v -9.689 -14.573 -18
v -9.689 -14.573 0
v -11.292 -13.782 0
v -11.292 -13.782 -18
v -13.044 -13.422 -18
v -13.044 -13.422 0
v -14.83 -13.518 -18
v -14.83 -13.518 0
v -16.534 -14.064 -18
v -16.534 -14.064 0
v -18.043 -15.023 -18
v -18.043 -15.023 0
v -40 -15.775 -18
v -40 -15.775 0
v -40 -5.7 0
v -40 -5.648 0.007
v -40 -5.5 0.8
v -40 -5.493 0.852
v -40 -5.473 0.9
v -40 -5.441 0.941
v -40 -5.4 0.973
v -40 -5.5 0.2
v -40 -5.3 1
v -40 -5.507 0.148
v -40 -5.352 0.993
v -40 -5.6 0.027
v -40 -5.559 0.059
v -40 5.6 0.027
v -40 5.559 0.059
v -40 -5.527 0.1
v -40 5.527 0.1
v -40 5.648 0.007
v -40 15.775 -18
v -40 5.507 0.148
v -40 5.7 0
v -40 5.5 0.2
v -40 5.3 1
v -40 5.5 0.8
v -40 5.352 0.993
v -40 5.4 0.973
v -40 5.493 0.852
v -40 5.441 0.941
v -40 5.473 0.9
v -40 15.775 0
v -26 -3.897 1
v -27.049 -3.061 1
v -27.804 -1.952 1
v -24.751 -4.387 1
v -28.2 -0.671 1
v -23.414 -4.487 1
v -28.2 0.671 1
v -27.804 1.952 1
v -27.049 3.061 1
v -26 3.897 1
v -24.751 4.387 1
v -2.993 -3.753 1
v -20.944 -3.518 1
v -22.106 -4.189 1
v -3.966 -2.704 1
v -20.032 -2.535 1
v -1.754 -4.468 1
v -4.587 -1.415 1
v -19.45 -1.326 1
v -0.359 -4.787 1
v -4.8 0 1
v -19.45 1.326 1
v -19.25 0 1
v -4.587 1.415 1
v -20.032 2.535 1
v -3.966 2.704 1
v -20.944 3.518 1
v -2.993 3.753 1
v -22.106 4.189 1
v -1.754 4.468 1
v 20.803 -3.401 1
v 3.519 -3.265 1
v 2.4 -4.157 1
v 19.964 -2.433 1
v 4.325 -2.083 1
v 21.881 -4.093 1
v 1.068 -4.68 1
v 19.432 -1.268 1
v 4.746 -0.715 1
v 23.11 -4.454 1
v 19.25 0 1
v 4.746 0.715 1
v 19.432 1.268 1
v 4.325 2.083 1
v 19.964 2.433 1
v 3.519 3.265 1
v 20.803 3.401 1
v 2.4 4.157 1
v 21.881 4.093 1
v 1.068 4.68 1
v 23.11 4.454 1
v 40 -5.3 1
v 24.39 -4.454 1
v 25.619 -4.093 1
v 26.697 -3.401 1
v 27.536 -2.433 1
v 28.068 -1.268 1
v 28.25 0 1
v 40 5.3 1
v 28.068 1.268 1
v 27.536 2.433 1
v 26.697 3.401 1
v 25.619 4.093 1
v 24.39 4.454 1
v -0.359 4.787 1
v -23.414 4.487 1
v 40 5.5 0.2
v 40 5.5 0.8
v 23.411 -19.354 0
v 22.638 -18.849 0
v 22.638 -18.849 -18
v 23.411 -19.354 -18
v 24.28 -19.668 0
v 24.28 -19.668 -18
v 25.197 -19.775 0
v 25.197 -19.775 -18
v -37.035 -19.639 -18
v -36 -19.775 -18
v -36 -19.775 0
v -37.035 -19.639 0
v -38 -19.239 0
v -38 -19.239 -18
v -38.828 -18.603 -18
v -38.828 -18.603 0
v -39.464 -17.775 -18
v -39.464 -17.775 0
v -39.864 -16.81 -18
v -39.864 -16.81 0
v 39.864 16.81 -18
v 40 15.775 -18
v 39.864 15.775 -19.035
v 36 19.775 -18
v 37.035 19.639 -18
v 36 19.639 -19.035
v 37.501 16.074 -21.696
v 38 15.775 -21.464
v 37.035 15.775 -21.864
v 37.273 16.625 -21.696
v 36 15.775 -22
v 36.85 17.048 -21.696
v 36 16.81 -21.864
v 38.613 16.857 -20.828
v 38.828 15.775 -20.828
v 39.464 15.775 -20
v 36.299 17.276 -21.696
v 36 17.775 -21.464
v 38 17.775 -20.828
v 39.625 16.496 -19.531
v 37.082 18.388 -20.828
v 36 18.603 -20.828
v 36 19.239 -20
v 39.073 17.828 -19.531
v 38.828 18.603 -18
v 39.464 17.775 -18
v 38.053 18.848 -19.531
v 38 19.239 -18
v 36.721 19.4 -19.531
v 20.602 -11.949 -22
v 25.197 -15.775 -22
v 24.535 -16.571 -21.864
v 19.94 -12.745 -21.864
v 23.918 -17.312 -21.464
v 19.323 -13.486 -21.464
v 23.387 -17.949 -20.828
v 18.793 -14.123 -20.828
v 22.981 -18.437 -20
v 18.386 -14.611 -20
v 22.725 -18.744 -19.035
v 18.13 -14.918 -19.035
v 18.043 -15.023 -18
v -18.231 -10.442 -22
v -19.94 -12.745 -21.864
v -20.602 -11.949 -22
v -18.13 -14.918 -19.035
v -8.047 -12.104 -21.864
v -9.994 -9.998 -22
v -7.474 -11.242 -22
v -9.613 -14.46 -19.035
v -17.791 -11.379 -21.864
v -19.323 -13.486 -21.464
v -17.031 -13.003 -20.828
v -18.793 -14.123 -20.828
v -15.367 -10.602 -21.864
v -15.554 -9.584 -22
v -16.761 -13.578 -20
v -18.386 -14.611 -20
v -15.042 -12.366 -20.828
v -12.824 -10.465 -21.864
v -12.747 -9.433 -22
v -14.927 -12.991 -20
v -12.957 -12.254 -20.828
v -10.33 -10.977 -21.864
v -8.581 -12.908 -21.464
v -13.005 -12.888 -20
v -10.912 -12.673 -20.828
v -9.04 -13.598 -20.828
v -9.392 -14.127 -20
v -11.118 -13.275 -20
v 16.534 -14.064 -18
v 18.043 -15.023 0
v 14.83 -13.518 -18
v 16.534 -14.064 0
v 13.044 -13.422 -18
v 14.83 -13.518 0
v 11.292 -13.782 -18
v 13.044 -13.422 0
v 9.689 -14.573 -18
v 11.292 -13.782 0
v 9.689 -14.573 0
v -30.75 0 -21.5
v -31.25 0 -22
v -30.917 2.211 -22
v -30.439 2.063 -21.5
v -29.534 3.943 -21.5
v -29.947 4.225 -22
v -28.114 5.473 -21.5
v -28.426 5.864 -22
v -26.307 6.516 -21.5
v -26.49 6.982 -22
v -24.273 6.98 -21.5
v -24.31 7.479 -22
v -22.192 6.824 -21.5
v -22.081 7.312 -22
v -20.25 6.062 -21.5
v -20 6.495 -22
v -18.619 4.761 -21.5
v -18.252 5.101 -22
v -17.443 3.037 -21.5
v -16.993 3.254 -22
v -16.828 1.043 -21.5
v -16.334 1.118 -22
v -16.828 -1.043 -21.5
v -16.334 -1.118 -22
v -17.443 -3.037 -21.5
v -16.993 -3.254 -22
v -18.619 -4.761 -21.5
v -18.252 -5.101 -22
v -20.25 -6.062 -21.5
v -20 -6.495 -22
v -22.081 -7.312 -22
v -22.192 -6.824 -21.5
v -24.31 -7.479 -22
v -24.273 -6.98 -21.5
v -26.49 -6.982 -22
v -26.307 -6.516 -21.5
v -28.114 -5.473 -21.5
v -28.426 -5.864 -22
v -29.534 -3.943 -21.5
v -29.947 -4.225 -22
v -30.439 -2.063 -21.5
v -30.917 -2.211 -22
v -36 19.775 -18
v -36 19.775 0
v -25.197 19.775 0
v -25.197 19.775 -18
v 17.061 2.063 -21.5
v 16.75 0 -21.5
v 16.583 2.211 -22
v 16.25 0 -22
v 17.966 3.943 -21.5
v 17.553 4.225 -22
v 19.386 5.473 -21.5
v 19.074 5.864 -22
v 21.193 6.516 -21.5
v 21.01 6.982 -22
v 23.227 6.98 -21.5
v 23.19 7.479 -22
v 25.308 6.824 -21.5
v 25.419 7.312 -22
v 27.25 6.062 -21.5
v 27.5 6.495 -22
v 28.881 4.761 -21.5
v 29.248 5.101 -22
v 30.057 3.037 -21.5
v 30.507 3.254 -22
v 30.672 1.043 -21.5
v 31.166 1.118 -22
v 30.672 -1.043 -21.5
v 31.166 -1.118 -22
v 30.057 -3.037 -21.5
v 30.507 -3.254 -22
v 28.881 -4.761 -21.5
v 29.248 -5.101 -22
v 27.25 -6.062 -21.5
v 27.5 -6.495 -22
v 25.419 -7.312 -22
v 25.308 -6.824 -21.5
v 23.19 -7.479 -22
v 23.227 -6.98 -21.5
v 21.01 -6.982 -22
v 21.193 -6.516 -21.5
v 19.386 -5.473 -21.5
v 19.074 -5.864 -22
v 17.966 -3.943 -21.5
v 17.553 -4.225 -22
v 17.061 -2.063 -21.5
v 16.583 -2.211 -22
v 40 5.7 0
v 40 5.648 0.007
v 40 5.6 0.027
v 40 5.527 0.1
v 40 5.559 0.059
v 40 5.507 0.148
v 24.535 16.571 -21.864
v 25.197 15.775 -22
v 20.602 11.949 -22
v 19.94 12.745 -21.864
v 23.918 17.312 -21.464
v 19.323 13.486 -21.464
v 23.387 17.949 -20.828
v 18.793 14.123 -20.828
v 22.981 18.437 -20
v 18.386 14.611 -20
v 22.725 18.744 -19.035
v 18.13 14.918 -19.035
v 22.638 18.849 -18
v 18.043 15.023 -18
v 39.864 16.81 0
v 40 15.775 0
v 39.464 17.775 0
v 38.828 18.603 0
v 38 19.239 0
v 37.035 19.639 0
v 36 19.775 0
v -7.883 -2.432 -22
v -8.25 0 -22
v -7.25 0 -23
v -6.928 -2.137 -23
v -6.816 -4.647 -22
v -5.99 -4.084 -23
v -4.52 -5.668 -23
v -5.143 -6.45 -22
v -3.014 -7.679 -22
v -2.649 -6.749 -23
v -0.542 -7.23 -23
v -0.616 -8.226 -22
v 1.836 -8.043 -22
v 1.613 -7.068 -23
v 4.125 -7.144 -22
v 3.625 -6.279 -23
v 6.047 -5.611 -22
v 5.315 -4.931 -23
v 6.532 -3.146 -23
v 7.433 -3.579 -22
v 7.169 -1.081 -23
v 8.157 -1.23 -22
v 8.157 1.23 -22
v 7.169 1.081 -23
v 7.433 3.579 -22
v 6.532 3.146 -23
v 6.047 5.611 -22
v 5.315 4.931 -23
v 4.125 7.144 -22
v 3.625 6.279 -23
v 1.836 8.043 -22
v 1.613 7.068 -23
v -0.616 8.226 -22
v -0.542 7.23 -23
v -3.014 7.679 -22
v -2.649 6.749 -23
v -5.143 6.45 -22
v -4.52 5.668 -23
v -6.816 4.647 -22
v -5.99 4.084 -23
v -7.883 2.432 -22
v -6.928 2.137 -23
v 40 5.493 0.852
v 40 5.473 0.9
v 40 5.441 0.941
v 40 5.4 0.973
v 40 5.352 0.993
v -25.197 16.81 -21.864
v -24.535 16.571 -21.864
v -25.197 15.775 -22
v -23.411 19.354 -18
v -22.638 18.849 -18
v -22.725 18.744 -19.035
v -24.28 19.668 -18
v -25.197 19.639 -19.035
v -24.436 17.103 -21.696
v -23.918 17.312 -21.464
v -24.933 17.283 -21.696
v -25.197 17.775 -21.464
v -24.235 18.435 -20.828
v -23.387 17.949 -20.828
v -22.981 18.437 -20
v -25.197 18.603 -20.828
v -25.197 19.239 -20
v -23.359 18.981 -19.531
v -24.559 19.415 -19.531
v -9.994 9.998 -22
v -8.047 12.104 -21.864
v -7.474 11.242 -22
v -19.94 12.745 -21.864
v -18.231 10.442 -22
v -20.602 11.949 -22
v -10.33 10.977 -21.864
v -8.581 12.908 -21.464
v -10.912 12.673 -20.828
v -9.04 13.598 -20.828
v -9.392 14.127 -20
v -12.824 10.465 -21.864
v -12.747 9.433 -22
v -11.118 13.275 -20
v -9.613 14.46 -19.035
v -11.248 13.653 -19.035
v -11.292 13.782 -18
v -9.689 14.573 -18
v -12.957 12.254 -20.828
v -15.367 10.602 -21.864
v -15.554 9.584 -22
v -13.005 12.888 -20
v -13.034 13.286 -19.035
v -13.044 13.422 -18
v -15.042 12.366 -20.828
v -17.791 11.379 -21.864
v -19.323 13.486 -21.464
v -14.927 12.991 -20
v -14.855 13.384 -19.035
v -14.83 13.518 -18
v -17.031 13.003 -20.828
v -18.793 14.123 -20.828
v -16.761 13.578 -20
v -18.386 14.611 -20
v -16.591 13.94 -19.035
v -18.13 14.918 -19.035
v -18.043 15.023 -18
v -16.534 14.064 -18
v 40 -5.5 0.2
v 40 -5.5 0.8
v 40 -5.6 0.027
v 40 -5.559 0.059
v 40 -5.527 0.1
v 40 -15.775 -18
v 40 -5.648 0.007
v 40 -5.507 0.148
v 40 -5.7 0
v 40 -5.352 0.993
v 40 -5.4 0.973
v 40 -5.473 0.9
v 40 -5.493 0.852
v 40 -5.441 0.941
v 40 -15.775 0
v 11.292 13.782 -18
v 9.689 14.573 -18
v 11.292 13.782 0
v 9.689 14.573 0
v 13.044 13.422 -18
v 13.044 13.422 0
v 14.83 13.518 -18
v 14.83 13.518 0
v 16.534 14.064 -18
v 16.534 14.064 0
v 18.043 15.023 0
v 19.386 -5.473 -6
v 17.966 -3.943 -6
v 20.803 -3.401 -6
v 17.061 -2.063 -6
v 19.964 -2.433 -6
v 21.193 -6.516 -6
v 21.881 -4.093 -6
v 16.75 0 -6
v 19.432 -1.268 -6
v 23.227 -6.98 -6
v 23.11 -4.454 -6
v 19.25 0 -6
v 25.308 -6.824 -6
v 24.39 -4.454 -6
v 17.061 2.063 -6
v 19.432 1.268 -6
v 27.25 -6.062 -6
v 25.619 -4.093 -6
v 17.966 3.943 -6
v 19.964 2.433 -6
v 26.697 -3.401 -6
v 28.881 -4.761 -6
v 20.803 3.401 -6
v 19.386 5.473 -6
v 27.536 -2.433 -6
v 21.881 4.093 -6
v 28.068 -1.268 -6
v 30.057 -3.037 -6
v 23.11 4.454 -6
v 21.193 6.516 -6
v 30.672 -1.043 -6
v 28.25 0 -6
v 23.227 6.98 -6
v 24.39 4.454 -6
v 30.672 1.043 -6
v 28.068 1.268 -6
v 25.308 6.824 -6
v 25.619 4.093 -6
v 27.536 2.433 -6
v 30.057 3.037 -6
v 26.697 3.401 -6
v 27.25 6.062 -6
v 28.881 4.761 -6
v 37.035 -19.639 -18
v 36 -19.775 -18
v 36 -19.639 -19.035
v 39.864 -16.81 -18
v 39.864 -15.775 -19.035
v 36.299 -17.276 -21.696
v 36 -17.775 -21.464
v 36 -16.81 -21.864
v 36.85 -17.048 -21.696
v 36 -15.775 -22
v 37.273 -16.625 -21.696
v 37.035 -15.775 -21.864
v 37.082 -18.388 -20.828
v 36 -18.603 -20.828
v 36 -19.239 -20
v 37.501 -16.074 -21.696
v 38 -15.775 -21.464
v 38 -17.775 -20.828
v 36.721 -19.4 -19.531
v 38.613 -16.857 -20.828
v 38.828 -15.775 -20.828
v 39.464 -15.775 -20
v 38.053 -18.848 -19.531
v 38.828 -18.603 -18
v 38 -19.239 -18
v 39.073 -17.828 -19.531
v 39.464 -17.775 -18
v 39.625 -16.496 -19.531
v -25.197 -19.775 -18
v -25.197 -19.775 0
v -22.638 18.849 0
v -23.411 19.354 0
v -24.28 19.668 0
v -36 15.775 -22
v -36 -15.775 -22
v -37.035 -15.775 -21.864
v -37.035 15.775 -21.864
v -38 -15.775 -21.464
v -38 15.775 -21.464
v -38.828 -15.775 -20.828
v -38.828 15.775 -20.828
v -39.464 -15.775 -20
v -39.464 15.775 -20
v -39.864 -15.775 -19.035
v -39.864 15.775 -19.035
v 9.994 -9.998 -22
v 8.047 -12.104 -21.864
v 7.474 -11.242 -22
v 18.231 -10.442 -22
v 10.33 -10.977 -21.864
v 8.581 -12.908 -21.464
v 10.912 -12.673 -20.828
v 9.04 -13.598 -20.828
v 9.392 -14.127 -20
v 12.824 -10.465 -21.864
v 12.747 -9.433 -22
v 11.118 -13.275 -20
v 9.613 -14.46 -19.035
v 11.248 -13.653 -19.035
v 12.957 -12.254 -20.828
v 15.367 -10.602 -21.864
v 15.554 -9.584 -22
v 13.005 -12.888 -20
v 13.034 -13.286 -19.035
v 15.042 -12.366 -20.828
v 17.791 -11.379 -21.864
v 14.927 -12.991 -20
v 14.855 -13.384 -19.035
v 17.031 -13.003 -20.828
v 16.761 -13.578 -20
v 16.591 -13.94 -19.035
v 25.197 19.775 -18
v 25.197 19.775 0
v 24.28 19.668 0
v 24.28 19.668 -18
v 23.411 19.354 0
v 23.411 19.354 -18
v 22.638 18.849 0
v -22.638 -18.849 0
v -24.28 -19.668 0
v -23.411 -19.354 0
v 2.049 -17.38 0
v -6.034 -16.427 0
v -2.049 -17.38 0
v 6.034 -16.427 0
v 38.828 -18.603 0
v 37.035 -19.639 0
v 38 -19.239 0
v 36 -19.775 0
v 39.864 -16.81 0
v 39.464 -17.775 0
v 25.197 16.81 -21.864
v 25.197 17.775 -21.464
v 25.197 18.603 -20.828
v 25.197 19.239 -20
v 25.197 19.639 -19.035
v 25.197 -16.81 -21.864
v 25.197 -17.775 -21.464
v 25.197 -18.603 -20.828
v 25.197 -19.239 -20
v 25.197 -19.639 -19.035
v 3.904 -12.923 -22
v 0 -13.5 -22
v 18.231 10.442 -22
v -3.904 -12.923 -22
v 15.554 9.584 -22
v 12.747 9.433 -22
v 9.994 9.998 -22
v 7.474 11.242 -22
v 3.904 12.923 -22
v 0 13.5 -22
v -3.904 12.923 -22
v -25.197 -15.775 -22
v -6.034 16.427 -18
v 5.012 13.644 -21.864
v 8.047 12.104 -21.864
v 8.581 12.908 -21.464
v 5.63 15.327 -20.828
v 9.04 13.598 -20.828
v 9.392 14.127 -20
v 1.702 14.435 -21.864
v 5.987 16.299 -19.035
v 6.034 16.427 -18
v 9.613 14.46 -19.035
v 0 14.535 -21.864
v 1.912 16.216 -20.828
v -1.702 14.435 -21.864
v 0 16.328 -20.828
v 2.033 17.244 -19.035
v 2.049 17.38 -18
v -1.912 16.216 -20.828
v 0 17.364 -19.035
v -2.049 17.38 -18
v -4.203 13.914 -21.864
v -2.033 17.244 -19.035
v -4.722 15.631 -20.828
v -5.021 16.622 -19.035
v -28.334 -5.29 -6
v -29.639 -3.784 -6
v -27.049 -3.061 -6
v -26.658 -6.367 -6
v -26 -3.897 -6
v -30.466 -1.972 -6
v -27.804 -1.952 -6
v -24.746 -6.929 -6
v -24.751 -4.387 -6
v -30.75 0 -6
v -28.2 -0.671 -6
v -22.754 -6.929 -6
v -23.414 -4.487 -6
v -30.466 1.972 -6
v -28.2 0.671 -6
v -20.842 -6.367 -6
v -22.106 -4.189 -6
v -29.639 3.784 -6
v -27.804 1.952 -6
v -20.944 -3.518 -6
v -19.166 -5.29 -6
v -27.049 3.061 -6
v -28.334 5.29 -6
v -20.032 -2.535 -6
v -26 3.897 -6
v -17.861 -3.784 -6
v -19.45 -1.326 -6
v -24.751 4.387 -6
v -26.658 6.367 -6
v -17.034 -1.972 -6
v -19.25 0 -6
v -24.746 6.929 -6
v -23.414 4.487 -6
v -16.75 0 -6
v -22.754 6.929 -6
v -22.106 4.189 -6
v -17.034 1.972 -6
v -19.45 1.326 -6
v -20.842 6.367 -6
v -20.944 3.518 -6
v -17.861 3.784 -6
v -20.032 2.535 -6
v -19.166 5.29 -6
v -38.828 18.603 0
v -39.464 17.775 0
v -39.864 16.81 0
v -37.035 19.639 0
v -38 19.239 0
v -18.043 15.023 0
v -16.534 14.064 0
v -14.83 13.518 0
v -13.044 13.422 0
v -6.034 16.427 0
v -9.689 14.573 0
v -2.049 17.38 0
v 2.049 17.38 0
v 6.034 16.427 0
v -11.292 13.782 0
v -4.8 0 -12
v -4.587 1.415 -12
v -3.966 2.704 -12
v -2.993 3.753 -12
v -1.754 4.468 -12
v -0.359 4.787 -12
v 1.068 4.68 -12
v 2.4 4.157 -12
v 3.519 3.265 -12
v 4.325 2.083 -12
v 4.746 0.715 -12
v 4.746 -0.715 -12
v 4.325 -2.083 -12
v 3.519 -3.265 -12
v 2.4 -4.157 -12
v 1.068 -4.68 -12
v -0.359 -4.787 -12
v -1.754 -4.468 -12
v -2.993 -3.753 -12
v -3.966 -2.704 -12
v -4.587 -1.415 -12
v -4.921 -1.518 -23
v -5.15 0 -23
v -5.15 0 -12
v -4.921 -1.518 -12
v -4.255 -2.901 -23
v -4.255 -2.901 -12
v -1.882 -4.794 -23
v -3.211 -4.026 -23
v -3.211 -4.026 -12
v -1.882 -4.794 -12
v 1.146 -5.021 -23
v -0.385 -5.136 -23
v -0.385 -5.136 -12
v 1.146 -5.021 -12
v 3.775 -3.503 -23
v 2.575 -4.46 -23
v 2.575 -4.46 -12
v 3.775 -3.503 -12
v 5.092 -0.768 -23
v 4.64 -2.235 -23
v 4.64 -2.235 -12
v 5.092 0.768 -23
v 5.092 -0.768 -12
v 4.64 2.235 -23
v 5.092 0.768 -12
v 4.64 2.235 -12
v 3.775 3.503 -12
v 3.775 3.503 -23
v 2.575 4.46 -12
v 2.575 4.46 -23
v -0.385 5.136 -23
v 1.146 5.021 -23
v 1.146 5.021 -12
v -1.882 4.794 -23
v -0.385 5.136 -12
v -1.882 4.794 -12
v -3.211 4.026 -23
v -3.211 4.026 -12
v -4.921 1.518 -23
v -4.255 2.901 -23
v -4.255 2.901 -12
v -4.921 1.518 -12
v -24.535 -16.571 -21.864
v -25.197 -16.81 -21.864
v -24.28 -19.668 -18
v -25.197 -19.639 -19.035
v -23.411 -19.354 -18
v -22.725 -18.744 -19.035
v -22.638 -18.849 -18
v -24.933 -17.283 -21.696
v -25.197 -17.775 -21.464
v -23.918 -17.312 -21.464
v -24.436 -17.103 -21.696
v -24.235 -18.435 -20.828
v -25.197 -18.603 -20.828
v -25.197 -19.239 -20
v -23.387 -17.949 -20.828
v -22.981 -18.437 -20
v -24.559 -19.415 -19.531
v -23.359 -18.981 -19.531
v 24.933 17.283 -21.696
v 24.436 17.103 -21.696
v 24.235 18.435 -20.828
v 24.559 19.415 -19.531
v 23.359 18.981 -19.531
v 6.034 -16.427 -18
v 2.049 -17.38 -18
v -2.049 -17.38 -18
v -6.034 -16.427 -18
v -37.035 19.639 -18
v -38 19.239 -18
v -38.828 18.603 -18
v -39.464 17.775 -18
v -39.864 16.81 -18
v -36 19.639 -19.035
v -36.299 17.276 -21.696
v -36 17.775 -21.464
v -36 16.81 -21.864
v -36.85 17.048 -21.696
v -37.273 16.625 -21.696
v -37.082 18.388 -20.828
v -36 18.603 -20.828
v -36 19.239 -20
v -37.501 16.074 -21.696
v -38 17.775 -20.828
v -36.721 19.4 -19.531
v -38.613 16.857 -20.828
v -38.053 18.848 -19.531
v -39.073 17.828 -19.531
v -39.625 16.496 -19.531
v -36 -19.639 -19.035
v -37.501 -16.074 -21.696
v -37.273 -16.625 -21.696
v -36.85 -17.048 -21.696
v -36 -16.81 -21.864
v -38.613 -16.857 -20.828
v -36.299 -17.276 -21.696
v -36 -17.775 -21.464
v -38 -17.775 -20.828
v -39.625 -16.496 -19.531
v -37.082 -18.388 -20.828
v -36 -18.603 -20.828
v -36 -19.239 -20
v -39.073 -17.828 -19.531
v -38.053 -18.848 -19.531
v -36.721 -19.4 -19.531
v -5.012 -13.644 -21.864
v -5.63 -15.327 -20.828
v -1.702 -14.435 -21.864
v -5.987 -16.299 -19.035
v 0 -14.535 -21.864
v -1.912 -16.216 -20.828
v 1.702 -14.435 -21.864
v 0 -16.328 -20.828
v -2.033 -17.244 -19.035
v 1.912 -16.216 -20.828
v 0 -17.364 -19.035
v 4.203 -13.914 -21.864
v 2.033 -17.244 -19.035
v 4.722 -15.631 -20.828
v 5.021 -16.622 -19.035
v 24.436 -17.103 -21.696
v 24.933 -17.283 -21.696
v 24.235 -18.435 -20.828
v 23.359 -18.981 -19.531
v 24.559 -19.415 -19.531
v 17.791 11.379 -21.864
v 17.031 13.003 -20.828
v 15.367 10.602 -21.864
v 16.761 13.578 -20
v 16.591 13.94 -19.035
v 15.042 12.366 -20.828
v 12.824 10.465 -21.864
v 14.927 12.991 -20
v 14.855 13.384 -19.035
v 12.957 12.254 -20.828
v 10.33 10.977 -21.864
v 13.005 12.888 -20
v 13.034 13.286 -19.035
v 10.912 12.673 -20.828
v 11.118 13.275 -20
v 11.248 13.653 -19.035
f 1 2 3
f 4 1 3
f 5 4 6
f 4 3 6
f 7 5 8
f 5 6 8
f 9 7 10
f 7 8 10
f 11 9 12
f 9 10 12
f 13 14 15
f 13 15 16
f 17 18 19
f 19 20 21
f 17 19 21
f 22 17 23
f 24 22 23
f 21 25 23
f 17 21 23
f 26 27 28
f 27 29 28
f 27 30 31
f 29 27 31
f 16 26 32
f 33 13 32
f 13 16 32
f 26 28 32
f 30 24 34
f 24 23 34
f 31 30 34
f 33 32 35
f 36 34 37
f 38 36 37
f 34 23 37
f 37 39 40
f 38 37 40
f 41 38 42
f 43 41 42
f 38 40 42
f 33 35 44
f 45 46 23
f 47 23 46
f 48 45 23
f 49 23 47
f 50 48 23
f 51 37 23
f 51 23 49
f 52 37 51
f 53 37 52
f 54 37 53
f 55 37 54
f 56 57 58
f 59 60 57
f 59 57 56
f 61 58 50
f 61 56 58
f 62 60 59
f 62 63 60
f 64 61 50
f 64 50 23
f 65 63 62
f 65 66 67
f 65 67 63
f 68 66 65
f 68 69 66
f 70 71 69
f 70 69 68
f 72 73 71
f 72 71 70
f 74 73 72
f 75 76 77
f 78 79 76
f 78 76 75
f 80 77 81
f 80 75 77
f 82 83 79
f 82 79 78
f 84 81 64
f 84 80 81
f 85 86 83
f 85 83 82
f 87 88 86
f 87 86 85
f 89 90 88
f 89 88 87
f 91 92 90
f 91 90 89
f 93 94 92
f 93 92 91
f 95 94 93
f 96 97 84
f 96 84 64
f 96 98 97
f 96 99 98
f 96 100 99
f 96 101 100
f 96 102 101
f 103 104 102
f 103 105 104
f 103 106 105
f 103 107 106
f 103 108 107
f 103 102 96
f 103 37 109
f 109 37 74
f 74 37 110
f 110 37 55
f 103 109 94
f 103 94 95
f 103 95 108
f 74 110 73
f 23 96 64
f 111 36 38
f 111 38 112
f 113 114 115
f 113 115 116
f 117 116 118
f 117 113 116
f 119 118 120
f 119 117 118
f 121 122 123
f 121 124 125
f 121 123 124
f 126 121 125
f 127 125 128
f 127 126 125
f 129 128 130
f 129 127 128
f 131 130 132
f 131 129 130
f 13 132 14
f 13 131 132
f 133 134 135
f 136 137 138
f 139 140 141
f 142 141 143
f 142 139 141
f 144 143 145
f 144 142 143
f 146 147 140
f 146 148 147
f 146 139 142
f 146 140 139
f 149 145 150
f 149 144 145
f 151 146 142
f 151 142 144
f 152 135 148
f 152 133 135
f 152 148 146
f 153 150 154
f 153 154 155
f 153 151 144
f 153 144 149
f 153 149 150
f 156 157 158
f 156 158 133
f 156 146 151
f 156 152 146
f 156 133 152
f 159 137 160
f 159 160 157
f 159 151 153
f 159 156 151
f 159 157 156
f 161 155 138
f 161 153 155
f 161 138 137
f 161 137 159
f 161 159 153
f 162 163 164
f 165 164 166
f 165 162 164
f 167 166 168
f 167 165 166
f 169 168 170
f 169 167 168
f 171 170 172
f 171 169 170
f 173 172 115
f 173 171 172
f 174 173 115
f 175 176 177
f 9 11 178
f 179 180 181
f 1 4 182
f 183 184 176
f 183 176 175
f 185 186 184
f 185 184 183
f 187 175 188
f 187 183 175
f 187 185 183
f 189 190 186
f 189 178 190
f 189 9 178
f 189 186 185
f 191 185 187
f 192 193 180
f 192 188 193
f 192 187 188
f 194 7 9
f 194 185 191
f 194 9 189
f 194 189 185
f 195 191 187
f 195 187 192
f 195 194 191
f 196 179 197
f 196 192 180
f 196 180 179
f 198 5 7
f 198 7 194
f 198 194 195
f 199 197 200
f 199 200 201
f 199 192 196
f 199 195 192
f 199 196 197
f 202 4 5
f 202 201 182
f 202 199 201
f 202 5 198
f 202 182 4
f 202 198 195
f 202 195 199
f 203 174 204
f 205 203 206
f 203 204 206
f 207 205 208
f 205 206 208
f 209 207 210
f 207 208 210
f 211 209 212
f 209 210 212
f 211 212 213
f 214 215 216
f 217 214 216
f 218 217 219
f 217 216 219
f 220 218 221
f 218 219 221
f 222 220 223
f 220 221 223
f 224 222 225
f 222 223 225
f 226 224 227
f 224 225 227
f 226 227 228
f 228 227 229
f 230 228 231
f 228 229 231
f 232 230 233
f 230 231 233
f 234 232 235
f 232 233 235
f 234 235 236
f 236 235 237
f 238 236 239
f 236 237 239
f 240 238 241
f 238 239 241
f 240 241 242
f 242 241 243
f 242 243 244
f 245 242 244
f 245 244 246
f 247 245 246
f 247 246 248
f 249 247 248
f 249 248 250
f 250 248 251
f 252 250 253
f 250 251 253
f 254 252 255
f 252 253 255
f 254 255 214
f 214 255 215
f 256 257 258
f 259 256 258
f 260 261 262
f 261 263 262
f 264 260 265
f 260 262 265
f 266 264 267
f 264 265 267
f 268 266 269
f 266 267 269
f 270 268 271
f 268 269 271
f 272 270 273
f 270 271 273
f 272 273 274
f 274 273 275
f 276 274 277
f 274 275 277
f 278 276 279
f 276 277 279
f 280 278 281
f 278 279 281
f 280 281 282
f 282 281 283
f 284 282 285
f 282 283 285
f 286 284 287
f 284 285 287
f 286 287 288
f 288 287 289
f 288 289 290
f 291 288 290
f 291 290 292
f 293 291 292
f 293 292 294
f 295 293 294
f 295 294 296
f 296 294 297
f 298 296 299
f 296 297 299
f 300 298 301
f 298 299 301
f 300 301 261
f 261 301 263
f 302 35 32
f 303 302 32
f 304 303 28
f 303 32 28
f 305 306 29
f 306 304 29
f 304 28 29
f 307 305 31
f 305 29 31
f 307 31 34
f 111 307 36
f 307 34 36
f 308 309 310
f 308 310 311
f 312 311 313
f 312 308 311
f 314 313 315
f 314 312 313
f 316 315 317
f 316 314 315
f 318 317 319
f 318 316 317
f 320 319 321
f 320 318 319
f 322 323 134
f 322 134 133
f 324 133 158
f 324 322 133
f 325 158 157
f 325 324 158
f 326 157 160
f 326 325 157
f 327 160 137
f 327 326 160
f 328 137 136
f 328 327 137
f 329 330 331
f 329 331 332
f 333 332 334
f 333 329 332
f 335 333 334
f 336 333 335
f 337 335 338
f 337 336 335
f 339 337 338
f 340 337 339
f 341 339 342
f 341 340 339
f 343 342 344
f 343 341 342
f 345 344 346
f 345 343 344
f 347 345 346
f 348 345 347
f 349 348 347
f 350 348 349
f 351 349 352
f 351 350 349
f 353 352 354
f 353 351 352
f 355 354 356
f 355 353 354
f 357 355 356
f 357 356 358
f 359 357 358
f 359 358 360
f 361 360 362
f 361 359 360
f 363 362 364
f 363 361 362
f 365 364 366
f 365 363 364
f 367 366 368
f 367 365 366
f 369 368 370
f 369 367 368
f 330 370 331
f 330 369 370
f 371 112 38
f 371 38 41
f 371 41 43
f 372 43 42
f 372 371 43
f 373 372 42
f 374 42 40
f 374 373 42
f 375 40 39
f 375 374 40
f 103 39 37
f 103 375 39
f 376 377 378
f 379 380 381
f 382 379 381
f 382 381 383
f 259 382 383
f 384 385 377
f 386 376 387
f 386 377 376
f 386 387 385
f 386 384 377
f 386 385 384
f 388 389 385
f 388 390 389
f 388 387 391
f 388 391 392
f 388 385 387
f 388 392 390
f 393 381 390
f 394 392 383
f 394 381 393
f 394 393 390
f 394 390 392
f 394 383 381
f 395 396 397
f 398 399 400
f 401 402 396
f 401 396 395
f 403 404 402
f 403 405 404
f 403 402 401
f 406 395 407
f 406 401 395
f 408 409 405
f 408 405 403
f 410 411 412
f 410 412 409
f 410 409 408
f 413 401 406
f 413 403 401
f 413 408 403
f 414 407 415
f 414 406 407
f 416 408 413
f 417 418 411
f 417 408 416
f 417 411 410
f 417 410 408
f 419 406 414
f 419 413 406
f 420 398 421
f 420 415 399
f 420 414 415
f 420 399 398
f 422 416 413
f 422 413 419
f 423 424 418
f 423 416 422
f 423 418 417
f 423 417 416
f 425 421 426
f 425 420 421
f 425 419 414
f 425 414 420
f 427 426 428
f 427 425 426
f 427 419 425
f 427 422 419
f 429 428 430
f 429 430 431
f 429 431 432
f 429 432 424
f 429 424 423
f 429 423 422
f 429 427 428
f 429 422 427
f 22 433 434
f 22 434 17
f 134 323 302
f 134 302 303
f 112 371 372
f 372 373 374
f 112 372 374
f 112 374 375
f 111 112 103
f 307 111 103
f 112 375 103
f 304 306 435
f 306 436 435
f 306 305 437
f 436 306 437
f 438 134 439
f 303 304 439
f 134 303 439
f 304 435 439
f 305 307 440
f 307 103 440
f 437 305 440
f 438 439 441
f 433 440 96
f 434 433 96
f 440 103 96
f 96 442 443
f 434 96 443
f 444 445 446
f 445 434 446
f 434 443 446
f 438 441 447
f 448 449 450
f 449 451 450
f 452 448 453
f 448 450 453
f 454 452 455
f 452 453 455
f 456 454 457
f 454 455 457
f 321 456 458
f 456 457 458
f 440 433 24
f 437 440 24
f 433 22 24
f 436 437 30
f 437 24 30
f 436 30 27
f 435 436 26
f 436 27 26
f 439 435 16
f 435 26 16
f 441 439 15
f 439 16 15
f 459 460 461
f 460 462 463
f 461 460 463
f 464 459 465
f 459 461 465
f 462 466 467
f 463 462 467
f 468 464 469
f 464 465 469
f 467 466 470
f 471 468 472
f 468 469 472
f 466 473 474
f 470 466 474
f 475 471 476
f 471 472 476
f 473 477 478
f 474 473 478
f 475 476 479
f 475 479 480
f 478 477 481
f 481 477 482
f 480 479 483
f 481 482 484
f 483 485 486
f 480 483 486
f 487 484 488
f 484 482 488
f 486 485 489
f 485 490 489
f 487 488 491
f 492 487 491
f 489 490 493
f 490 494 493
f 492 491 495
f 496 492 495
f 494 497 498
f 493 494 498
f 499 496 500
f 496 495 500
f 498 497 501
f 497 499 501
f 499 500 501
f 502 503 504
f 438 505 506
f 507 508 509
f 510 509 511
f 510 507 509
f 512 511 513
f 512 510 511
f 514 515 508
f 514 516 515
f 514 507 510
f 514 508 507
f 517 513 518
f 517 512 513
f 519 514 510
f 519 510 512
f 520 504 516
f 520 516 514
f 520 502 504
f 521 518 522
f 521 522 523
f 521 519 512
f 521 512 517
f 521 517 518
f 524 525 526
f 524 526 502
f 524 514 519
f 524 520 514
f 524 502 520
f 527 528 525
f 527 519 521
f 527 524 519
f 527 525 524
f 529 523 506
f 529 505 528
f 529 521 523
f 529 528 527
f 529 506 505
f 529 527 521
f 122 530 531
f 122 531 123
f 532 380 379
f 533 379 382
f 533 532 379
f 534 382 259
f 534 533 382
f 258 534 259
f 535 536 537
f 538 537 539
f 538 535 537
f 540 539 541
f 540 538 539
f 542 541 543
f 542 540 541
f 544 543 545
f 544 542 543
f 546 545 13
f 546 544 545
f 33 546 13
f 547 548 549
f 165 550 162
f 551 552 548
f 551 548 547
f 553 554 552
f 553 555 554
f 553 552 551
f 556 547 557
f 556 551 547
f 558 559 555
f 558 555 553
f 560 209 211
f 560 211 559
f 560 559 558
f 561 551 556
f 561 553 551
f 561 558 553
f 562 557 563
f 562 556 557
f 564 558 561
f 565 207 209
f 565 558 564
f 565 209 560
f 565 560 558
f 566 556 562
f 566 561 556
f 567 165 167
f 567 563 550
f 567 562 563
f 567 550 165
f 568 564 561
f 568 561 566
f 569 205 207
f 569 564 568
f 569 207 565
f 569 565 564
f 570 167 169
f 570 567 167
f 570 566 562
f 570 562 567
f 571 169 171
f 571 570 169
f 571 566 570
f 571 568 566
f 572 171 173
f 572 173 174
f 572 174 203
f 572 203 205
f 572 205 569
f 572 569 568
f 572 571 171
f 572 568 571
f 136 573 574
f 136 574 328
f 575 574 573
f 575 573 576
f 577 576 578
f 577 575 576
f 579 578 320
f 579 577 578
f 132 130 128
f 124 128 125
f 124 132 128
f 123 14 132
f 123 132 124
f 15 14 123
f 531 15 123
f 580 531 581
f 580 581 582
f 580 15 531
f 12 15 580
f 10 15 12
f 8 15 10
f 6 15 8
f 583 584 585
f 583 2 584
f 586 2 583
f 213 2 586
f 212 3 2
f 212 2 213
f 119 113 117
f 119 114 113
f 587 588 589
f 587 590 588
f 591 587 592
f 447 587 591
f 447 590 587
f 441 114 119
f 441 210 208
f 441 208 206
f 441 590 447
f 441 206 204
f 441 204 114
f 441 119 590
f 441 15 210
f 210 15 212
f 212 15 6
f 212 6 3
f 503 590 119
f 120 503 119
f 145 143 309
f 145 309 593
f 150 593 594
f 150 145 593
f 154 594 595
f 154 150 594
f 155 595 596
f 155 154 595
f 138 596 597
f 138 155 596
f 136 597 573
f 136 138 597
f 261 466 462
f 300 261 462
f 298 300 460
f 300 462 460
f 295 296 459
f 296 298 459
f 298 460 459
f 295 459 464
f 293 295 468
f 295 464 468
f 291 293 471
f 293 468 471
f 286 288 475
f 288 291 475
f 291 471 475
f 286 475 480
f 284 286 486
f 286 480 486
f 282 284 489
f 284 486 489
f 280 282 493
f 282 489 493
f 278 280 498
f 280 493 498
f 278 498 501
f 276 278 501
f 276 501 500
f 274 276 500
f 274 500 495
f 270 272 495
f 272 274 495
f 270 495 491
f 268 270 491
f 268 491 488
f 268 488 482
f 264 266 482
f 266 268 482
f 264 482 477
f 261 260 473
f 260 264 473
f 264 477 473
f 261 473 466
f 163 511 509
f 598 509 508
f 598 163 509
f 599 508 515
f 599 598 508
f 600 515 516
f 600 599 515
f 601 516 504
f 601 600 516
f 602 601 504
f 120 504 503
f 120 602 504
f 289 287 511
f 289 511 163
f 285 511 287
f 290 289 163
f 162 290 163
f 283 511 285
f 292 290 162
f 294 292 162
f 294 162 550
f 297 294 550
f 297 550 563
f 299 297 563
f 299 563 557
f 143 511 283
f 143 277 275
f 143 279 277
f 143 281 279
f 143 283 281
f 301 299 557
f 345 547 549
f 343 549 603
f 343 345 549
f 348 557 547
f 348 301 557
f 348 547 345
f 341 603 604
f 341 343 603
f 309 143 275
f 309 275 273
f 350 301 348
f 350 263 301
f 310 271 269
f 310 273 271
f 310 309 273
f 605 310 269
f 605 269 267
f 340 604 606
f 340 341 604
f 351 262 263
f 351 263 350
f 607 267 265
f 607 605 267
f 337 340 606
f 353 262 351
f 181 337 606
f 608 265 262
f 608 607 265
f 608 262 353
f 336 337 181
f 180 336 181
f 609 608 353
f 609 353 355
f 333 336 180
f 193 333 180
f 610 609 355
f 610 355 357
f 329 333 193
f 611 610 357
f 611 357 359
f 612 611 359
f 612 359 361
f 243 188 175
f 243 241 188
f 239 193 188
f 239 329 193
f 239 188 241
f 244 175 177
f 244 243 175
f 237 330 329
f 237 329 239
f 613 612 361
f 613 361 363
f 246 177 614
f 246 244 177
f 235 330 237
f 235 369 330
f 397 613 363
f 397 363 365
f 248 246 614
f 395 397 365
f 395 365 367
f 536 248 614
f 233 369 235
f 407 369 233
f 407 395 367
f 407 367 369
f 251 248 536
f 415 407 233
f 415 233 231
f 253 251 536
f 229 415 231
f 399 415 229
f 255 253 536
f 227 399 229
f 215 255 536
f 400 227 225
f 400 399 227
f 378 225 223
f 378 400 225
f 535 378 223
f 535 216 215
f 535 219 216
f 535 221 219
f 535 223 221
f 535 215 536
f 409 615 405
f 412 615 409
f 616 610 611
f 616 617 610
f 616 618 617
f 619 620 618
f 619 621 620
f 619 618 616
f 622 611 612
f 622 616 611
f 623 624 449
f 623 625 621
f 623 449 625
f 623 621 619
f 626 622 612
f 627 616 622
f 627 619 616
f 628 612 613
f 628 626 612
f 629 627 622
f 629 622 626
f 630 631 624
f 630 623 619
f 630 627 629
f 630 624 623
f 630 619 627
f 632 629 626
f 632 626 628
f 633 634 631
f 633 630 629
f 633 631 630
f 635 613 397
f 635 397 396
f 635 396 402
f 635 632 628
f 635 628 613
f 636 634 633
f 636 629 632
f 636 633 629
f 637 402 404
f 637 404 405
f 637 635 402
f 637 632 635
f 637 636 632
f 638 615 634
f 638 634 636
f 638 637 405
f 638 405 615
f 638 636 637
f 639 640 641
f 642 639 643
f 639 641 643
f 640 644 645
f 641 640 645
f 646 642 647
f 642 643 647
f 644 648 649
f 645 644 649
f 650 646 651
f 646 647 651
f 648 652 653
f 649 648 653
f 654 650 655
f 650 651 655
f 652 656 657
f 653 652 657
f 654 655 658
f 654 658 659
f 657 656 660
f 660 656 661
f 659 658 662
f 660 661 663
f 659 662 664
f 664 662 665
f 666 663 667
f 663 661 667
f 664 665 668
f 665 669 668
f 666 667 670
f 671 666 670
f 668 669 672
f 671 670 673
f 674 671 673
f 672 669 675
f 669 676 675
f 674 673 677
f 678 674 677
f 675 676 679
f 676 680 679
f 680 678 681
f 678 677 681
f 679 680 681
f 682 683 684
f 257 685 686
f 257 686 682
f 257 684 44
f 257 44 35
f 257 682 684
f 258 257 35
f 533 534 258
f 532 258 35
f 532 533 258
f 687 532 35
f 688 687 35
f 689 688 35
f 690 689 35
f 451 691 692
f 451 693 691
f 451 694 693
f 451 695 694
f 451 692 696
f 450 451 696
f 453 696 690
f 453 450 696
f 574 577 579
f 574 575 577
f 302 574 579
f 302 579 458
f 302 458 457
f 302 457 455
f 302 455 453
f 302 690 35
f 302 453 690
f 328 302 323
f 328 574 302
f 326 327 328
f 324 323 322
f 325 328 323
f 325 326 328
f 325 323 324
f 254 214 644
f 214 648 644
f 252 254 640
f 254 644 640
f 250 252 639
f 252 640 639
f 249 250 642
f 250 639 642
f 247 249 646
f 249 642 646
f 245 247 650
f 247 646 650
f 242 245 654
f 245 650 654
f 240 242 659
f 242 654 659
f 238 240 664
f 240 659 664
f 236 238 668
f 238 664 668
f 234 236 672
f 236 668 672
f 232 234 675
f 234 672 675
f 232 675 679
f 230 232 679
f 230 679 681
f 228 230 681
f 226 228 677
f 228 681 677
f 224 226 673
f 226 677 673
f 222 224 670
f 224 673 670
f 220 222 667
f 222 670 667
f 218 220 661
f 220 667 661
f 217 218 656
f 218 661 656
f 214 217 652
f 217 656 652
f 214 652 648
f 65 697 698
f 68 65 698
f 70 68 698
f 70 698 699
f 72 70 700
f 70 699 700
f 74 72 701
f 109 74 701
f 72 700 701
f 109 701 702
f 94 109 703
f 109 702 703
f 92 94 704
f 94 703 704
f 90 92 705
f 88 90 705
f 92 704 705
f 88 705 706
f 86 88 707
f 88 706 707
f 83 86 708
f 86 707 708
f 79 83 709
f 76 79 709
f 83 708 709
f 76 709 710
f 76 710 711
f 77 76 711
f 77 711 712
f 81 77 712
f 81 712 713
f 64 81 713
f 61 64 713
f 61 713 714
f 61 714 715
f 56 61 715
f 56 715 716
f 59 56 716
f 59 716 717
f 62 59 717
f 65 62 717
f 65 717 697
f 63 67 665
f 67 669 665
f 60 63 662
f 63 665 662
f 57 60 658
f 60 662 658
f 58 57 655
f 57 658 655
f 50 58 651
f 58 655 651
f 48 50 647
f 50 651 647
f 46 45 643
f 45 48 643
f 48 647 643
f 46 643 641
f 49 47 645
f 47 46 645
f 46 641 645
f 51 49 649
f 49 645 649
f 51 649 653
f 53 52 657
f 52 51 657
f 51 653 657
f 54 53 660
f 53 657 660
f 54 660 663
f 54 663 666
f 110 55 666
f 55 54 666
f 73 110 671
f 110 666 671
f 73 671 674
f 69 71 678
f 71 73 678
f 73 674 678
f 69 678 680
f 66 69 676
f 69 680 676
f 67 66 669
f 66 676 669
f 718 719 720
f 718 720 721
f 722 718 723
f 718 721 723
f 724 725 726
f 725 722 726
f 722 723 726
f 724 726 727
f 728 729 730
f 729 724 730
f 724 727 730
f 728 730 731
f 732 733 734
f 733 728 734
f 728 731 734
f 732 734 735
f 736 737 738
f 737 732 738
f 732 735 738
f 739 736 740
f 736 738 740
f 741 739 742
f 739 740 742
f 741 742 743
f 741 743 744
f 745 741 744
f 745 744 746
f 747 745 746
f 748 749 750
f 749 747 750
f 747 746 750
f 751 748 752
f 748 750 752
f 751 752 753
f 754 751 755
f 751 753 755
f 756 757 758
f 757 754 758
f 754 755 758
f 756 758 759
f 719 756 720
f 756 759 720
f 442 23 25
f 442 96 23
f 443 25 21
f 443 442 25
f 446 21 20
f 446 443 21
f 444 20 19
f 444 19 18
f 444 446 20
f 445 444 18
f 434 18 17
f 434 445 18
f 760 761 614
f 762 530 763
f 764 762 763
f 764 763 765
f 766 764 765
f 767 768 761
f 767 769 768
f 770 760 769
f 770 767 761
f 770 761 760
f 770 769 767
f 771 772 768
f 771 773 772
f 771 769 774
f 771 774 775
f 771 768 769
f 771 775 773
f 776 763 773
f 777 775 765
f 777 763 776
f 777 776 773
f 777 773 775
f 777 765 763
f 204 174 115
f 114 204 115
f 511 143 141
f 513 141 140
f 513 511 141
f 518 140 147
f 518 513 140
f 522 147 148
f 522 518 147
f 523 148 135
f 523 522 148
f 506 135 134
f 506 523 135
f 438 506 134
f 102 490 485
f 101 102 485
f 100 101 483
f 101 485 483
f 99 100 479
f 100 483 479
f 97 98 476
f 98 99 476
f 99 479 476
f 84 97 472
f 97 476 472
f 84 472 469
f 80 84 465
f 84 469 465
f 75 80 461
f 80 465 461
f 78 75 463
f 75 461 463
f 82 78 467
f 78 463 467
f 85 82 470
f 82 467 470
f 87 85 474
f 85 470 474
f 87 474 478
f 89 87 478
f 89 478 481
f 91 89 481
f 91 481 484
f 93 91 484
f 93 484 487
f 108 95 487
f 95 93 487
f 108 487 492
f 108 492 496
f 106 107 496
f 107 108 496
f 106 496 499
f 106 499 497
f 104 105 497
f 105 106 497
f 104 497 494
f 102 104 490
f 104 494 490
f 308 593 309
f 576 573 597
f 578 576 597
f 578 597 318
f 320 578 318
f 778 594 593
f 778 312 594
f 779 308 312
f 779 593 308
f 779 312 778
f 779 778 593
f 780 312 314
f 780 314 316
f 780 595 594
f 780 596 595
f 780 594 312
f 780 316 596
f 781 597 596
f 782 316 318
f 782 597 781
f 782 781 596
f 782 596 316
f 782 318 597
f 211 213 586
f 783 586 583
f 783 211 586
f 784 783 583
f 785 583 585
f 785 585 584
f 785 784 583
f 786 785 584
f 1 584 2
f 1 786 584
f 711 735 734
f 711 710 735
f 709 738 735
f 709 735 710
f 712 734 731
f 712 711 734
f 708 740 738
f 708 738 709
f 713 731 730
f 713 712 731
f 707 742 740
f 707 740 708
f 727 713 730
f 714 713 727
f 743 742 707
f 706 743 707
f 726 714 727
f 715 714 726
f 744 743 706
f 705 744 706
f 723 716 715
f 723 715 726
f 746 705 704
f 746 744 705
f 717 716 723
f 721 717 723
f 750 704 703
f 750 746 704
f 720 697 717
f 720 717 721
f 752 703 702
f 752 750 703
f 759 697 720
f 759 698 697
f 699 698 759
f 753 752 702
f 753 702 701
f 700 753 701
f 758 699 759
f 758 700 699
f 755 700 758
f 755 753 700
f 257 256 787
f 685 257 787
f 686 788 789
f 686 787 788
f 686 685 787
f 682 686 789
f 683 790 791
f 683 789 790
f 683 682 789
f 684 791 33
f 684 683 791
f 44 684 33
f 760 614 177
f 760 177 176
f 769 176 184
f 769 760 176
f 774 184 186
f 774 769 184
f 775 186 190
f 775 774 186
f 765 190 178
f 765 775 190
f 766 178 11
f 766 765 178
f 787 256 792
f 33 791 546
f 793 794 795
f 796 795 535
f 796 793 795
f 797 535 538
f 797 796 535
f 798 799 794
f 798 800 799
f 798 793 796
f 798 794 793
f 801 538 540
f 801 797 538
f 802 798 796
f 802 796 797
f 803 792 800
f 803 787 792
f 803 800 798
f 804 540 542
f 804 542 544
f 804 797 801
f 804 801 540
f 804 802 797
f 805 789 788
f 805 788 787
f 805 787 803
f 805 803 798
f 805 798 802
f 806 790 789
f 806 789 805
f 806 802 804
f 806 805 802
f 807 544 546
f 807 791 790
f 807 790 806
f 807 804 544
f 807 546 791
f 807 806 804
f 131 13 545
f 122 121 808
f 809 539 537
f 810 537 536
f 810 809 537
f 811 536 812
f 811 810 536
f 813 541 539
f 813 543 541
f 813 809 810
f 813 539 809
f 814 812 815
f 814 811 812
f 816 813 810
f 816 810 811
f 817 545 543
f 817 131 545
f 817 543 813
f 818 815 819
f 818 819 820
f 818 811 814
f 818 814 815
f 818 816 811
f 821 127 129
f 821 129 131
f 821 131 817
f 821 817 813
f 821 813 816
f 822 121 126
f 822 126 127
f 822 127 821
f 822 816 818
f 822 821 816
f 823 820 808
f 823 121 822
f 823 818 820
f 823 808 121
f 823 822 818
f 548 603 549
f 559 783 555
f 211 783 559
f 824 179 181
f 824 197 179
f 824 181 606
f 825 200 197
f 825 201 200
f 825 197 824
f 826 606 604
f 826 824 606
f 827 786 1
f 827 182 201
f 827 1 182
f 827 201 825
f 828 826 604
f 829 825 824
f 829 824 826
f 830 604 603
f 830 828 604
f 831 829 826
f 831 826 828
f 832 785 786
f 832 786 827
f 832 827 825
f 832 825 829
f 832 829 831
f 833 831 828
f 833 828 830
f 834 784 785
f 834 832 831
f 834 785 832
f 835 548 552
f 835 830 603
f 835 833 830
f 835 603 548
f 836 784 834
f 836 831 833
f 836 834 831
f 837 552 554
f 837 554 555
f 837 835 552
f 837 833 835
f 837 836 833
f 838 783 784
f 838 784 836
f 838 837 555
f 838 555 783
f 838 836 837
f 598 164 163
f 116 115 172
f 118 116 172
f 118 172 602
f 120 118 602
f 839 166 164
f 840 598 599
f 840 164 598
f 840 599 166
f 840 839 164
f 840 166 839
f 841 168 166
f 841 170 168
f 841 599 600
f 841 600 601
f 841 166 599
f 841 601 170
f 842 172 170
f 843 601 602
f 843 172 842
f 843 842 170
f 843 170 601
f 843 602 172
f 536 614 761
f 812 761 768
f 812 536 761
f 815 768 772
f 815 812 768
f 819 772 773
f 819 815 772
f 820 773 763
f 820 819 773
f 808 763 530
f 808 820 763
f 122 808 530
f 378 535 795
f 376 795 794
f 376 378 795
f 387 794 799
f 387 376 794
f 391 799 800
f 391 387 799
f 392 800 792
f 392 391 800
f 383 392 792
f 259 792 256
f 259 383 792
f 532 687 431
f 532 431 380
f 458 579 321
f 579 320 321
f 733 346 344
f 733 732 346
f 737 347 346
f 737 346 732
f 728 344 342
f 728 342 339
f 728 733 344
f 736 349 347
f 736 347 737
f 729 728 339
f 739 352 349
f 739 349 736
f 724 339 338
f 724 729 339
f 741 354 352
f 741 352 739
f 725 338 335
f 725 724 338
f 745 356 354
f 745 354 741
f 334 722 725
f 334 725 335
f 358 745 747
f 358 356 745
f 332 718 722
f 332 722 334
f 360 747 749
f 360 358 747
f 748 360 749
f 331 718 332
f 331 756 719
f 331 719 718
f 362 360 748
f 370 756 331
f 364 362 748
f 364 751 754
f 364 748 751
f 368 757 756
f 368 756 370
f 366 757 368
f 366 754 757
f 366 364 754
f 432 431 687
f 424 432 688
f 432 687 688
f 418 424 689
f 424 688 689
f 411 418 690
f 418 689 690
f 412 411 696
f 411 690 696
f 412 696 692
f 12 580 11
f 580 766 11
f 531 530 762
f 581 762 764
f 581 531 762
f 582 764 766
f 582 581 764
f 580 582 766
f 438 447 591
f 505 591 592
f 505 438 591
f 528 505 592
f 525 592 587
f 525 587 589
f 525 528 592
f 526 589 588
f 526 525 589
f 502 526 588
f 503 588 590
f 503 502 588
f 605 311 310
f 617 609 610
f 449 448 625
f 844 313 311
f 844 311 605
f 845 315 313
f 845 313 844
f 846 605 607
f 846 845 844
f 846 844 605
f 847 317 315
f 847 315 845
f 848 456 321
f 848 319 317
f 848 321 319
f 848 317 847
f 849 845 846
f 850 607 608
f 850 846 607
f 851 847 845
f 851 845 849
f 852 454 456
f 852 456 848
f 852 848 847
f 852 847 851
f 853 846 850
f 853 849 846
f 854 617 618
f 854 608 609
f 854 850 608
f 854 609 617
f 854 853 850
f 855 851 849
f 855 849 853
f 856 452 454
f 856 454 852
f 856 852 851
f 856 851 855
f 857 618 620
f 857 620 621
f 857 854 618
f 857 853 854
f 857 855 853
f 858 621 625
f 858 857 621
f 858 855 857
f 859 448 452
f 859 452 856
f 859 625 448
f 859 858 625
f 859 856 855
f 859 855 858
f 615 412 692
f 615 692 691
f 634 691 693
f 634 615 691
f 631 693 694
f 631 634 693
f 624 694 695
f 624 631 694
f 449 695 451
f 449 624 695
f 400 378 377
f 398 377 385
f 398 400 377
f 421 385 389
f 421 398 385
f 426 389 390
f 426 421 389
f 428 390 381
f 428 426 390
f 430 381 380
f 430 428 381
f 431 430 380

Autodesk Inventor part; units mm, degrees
ref_plane "YZ Plane" through (0, 0, 0) normal (1, 0, 0) x (0, 1, 0)
ref_plane "XZ Plane" through (0, 0, 0) normal (0, 1, 0) x (-1, 0, 0)
ref_plane "XY Plane" through (0, 0, 0) normal (0, 0, 1) x (1, 0, 0)
sketch "Sketch1" plane through (0, 0, 0) normal (0, 0, 1) x (1, 0, 0)
  line L0 (-40, 19.775) -> (40, 19.775)
  line L1 (40, 19.775) -> (40, -19.775)
  line L2 (40, -19.775) -> (-40, -19.775)
  line L3 (-40, -19.775) -> (-40, 19.775)
  line L4 (-40, 19.775) -> (40, -19.775) construction
  line L5 (40, 19.775) -> (-40, -19.775) construction
  line L6 (40, -5.5) -> (-40, -5.5)
  line L7 (-40, -5.5) -> (-40, 5.5)
  line L8 (-40, 5.5) -> (40, 5.5)
  line L9 (40, 5.5) -> (40, -5.5)
  line L10 (40, -5.5) -> (-40, 5.5) construction
  line L11 (-40, -5.5) -> (40, 5.5) construction
  line L12 (23.75, 0) -> (-23.75, 0)
  circle A0 centre (-23.75, 0) radius 4.5
  circle A1 centre (23.75, 0) radius 4.5
  circle A2 centre (0, 0) radius 8
  point P0 (-40, 5.5)
  point P1 (-40, -5.5)
  point P2 (40, -5.5)
  point P3 (-5.8095, -5.5)
  point P4 (5.8095, -5.5)
  point P5 (5.8095, 5.5)
  point P6 (-5.8095, 5.5)
  dimension "d0" = 80
  dimension "d1" = 39.55
  dimension "d3" = 11
  dimension "d9" = 80
  dimension "d10" = 47.5
  dimension "d11" = 9
  dimension "d12" = 9
  dimension "d13" = 19.775
  dimension "d14" = 14.275
  dimension "d15" = 16
extrude "Extrusion1" add sketch "Sketch1" along normal blind 1 contours L8 A2 L6 L3 | L1 L6 A2 L8 | L8 A2 L12 | A2 L12 L6
extrude "Extrusion2" add sketch "Sketch1" against normal blind 6
fillet "Fillet1" radius 0.2 4 edges at (0, 5.5, 0) (0, 5.5, 1) (0, -5.5, 1) (0, -5.5, 0)
sketch "Sketch2" plane through (0, 0, -6) normal (0, 0, -1) x (-1, 0, 0)
  circle A0 centre (23.75, 0) radius 4.5 projected
  circle A1 centre (-23.75, 0) radius 4.5 projected
  circle A2 centre (23.75, 0) radius 7
  circle A3 centre (-23.75, 0) radius 7
  line L0 (-40, -19.775) -> (40, -19.775) projected
  line L1 (-40, 19.775) -> (-40, -19.775) projected
  line L2 (40, 19.775) -> (-40, 19.775) projected
  line L3 (40, -19.775) -> (40, 19.775) projected
  point P0 (0, 0)
  dimension "d16" = 14
  dimension "d17" = 14
extrude "Extrusion3" add sketch "Sketch2" along normal blind 16 contours L1 L2 L3 L0
sketch "Sketch3" plane through (0, 0, -22) normal (0, 0, -1) x (-1, 0, 0)
  circle A0 centre (0, 0) radius 5.15
  dimension "d21" = 10.3
extrude "Extrusion4" cut sketch "Sketch3" against normal blind 10
sketch "Sketch4" plane through (0, 0, -22) normal (0, 0, -1) x (-1, 0, 0)
  circle A0 centre (0, 0) radius 5.15 projected
  circle A1 centre (0, 0) radius 7.25
  dimension "d24" = 14.5
extrude "Extrusion5" add sketch "Sketch4" along normal blind 1
chamfer "Chamfer1" distance 1 distance2 1 1 edges at (7.25, 0, -22) measured on face at (-0.2913, -15.5824, -22)
sketch "Sketch5" plane through (0, 0, -12) normal (0, 0, -1) x (-1, 0, 0)
  circle A0 centre (0, 0) radius 4.8
  dimension "d30" = 9.6
extrude "Extrusion6" cut sketch "Sketch5" against normal blind 20
sketch "Sketch6" plane through (0, 0, -22) normal (0, 0, -1) x (-1, 0, 0)
  circle A0 centre (0, 0) radius 17.5
  circle A1 centre (23.75, 0) radius 7 projected
  circle A2 centre (-23.75, 0) radius 7 projected
  line L0 (40, -19.775) -> (40, 19.775) projected
  line L1 (40, 19.775) -> (-40, 19.775) projected
  line L2 (-40, 19.775) -> (-40, -19.775) projected
  line L3 (-40, -19.775) -> (40, -19.775) projected
  circle A3 centre (0, 0) radius 8.25 projected
  line L4 (-23.75, 0) -> (-23.75, 19.775)
  line L5 (13.4485, 11.1977) -> (23.75, 19.775)
  line L6 (-40, 19.775) -> (40, 19.775) projected
  line L7 (-23.75, 19.775) -> (-13.4485, 11.1977)
  dimension "d33" = 35
extrude "Extrusion7" cut sketch "Sketch6" against normal through all contours A0 L7 L1 L5
mirror "Mirror1" about plane through (0, 0, 0) normal (0, 1, 0) of "Extrusion7"
fillet "Fillet3" radius 7 4 edges at (13.4485, 11.1977, -11) (-13.4485, 11.1977, -11) (13.4485, -11.1977, -11) (-13.4485, -11.1977, -11)
fillet "Fillet4" radius 4 8 edges at (23.75, -19.775, -11) (40, -19.775, -11) (40, 19.775, -11) (23.75, 19.775, -11) (-23.75, 19.775, -11) (-40, 19.775, -11) (-40, -19.775, -11) (-23.75, -19.775, -11)
fillet "Fillet5" radius 4 24 edges at (38.8284, 18.6034, -22) (40, 0, -22) (38.8284, -18.6034, -22) (30.5986, -19.775, -22) (23.8363, -19.5364, -22) (20.3404, -16.9361, -22) (13.9404, -13.4128, -22) (0, -17.5, -22) (-13.9404, -13.4128, -22) (-20.3404, -16.9361, -22) (-23.8363, -19.5364, -22) (-30.5986, -19.775, -22) (-38.8284, -18.6034, -22) (-40, 0, -22) (-38.8284, 18.6034, -22) (-30.5986, 19.775, -22) (-23.8363, 19.5364, -22) (-20.3404, 16.9361, -22) (-13.9404, 13.4128, -22) (0, 17.5, -22) (13.9404, 13.4128, -22) (20.3404, 16.9361, -22) (23.8363, 19.5364, -22) (30.5986, 19.775, -22)
chamfer "Chamfer2" distance 0.5 angle 45 2 edges at (-16.75, 0, -22) (30.75, 0, -22)
equation "\"d9\" = d0"
properties part number "Base_Mount_Pedals"
